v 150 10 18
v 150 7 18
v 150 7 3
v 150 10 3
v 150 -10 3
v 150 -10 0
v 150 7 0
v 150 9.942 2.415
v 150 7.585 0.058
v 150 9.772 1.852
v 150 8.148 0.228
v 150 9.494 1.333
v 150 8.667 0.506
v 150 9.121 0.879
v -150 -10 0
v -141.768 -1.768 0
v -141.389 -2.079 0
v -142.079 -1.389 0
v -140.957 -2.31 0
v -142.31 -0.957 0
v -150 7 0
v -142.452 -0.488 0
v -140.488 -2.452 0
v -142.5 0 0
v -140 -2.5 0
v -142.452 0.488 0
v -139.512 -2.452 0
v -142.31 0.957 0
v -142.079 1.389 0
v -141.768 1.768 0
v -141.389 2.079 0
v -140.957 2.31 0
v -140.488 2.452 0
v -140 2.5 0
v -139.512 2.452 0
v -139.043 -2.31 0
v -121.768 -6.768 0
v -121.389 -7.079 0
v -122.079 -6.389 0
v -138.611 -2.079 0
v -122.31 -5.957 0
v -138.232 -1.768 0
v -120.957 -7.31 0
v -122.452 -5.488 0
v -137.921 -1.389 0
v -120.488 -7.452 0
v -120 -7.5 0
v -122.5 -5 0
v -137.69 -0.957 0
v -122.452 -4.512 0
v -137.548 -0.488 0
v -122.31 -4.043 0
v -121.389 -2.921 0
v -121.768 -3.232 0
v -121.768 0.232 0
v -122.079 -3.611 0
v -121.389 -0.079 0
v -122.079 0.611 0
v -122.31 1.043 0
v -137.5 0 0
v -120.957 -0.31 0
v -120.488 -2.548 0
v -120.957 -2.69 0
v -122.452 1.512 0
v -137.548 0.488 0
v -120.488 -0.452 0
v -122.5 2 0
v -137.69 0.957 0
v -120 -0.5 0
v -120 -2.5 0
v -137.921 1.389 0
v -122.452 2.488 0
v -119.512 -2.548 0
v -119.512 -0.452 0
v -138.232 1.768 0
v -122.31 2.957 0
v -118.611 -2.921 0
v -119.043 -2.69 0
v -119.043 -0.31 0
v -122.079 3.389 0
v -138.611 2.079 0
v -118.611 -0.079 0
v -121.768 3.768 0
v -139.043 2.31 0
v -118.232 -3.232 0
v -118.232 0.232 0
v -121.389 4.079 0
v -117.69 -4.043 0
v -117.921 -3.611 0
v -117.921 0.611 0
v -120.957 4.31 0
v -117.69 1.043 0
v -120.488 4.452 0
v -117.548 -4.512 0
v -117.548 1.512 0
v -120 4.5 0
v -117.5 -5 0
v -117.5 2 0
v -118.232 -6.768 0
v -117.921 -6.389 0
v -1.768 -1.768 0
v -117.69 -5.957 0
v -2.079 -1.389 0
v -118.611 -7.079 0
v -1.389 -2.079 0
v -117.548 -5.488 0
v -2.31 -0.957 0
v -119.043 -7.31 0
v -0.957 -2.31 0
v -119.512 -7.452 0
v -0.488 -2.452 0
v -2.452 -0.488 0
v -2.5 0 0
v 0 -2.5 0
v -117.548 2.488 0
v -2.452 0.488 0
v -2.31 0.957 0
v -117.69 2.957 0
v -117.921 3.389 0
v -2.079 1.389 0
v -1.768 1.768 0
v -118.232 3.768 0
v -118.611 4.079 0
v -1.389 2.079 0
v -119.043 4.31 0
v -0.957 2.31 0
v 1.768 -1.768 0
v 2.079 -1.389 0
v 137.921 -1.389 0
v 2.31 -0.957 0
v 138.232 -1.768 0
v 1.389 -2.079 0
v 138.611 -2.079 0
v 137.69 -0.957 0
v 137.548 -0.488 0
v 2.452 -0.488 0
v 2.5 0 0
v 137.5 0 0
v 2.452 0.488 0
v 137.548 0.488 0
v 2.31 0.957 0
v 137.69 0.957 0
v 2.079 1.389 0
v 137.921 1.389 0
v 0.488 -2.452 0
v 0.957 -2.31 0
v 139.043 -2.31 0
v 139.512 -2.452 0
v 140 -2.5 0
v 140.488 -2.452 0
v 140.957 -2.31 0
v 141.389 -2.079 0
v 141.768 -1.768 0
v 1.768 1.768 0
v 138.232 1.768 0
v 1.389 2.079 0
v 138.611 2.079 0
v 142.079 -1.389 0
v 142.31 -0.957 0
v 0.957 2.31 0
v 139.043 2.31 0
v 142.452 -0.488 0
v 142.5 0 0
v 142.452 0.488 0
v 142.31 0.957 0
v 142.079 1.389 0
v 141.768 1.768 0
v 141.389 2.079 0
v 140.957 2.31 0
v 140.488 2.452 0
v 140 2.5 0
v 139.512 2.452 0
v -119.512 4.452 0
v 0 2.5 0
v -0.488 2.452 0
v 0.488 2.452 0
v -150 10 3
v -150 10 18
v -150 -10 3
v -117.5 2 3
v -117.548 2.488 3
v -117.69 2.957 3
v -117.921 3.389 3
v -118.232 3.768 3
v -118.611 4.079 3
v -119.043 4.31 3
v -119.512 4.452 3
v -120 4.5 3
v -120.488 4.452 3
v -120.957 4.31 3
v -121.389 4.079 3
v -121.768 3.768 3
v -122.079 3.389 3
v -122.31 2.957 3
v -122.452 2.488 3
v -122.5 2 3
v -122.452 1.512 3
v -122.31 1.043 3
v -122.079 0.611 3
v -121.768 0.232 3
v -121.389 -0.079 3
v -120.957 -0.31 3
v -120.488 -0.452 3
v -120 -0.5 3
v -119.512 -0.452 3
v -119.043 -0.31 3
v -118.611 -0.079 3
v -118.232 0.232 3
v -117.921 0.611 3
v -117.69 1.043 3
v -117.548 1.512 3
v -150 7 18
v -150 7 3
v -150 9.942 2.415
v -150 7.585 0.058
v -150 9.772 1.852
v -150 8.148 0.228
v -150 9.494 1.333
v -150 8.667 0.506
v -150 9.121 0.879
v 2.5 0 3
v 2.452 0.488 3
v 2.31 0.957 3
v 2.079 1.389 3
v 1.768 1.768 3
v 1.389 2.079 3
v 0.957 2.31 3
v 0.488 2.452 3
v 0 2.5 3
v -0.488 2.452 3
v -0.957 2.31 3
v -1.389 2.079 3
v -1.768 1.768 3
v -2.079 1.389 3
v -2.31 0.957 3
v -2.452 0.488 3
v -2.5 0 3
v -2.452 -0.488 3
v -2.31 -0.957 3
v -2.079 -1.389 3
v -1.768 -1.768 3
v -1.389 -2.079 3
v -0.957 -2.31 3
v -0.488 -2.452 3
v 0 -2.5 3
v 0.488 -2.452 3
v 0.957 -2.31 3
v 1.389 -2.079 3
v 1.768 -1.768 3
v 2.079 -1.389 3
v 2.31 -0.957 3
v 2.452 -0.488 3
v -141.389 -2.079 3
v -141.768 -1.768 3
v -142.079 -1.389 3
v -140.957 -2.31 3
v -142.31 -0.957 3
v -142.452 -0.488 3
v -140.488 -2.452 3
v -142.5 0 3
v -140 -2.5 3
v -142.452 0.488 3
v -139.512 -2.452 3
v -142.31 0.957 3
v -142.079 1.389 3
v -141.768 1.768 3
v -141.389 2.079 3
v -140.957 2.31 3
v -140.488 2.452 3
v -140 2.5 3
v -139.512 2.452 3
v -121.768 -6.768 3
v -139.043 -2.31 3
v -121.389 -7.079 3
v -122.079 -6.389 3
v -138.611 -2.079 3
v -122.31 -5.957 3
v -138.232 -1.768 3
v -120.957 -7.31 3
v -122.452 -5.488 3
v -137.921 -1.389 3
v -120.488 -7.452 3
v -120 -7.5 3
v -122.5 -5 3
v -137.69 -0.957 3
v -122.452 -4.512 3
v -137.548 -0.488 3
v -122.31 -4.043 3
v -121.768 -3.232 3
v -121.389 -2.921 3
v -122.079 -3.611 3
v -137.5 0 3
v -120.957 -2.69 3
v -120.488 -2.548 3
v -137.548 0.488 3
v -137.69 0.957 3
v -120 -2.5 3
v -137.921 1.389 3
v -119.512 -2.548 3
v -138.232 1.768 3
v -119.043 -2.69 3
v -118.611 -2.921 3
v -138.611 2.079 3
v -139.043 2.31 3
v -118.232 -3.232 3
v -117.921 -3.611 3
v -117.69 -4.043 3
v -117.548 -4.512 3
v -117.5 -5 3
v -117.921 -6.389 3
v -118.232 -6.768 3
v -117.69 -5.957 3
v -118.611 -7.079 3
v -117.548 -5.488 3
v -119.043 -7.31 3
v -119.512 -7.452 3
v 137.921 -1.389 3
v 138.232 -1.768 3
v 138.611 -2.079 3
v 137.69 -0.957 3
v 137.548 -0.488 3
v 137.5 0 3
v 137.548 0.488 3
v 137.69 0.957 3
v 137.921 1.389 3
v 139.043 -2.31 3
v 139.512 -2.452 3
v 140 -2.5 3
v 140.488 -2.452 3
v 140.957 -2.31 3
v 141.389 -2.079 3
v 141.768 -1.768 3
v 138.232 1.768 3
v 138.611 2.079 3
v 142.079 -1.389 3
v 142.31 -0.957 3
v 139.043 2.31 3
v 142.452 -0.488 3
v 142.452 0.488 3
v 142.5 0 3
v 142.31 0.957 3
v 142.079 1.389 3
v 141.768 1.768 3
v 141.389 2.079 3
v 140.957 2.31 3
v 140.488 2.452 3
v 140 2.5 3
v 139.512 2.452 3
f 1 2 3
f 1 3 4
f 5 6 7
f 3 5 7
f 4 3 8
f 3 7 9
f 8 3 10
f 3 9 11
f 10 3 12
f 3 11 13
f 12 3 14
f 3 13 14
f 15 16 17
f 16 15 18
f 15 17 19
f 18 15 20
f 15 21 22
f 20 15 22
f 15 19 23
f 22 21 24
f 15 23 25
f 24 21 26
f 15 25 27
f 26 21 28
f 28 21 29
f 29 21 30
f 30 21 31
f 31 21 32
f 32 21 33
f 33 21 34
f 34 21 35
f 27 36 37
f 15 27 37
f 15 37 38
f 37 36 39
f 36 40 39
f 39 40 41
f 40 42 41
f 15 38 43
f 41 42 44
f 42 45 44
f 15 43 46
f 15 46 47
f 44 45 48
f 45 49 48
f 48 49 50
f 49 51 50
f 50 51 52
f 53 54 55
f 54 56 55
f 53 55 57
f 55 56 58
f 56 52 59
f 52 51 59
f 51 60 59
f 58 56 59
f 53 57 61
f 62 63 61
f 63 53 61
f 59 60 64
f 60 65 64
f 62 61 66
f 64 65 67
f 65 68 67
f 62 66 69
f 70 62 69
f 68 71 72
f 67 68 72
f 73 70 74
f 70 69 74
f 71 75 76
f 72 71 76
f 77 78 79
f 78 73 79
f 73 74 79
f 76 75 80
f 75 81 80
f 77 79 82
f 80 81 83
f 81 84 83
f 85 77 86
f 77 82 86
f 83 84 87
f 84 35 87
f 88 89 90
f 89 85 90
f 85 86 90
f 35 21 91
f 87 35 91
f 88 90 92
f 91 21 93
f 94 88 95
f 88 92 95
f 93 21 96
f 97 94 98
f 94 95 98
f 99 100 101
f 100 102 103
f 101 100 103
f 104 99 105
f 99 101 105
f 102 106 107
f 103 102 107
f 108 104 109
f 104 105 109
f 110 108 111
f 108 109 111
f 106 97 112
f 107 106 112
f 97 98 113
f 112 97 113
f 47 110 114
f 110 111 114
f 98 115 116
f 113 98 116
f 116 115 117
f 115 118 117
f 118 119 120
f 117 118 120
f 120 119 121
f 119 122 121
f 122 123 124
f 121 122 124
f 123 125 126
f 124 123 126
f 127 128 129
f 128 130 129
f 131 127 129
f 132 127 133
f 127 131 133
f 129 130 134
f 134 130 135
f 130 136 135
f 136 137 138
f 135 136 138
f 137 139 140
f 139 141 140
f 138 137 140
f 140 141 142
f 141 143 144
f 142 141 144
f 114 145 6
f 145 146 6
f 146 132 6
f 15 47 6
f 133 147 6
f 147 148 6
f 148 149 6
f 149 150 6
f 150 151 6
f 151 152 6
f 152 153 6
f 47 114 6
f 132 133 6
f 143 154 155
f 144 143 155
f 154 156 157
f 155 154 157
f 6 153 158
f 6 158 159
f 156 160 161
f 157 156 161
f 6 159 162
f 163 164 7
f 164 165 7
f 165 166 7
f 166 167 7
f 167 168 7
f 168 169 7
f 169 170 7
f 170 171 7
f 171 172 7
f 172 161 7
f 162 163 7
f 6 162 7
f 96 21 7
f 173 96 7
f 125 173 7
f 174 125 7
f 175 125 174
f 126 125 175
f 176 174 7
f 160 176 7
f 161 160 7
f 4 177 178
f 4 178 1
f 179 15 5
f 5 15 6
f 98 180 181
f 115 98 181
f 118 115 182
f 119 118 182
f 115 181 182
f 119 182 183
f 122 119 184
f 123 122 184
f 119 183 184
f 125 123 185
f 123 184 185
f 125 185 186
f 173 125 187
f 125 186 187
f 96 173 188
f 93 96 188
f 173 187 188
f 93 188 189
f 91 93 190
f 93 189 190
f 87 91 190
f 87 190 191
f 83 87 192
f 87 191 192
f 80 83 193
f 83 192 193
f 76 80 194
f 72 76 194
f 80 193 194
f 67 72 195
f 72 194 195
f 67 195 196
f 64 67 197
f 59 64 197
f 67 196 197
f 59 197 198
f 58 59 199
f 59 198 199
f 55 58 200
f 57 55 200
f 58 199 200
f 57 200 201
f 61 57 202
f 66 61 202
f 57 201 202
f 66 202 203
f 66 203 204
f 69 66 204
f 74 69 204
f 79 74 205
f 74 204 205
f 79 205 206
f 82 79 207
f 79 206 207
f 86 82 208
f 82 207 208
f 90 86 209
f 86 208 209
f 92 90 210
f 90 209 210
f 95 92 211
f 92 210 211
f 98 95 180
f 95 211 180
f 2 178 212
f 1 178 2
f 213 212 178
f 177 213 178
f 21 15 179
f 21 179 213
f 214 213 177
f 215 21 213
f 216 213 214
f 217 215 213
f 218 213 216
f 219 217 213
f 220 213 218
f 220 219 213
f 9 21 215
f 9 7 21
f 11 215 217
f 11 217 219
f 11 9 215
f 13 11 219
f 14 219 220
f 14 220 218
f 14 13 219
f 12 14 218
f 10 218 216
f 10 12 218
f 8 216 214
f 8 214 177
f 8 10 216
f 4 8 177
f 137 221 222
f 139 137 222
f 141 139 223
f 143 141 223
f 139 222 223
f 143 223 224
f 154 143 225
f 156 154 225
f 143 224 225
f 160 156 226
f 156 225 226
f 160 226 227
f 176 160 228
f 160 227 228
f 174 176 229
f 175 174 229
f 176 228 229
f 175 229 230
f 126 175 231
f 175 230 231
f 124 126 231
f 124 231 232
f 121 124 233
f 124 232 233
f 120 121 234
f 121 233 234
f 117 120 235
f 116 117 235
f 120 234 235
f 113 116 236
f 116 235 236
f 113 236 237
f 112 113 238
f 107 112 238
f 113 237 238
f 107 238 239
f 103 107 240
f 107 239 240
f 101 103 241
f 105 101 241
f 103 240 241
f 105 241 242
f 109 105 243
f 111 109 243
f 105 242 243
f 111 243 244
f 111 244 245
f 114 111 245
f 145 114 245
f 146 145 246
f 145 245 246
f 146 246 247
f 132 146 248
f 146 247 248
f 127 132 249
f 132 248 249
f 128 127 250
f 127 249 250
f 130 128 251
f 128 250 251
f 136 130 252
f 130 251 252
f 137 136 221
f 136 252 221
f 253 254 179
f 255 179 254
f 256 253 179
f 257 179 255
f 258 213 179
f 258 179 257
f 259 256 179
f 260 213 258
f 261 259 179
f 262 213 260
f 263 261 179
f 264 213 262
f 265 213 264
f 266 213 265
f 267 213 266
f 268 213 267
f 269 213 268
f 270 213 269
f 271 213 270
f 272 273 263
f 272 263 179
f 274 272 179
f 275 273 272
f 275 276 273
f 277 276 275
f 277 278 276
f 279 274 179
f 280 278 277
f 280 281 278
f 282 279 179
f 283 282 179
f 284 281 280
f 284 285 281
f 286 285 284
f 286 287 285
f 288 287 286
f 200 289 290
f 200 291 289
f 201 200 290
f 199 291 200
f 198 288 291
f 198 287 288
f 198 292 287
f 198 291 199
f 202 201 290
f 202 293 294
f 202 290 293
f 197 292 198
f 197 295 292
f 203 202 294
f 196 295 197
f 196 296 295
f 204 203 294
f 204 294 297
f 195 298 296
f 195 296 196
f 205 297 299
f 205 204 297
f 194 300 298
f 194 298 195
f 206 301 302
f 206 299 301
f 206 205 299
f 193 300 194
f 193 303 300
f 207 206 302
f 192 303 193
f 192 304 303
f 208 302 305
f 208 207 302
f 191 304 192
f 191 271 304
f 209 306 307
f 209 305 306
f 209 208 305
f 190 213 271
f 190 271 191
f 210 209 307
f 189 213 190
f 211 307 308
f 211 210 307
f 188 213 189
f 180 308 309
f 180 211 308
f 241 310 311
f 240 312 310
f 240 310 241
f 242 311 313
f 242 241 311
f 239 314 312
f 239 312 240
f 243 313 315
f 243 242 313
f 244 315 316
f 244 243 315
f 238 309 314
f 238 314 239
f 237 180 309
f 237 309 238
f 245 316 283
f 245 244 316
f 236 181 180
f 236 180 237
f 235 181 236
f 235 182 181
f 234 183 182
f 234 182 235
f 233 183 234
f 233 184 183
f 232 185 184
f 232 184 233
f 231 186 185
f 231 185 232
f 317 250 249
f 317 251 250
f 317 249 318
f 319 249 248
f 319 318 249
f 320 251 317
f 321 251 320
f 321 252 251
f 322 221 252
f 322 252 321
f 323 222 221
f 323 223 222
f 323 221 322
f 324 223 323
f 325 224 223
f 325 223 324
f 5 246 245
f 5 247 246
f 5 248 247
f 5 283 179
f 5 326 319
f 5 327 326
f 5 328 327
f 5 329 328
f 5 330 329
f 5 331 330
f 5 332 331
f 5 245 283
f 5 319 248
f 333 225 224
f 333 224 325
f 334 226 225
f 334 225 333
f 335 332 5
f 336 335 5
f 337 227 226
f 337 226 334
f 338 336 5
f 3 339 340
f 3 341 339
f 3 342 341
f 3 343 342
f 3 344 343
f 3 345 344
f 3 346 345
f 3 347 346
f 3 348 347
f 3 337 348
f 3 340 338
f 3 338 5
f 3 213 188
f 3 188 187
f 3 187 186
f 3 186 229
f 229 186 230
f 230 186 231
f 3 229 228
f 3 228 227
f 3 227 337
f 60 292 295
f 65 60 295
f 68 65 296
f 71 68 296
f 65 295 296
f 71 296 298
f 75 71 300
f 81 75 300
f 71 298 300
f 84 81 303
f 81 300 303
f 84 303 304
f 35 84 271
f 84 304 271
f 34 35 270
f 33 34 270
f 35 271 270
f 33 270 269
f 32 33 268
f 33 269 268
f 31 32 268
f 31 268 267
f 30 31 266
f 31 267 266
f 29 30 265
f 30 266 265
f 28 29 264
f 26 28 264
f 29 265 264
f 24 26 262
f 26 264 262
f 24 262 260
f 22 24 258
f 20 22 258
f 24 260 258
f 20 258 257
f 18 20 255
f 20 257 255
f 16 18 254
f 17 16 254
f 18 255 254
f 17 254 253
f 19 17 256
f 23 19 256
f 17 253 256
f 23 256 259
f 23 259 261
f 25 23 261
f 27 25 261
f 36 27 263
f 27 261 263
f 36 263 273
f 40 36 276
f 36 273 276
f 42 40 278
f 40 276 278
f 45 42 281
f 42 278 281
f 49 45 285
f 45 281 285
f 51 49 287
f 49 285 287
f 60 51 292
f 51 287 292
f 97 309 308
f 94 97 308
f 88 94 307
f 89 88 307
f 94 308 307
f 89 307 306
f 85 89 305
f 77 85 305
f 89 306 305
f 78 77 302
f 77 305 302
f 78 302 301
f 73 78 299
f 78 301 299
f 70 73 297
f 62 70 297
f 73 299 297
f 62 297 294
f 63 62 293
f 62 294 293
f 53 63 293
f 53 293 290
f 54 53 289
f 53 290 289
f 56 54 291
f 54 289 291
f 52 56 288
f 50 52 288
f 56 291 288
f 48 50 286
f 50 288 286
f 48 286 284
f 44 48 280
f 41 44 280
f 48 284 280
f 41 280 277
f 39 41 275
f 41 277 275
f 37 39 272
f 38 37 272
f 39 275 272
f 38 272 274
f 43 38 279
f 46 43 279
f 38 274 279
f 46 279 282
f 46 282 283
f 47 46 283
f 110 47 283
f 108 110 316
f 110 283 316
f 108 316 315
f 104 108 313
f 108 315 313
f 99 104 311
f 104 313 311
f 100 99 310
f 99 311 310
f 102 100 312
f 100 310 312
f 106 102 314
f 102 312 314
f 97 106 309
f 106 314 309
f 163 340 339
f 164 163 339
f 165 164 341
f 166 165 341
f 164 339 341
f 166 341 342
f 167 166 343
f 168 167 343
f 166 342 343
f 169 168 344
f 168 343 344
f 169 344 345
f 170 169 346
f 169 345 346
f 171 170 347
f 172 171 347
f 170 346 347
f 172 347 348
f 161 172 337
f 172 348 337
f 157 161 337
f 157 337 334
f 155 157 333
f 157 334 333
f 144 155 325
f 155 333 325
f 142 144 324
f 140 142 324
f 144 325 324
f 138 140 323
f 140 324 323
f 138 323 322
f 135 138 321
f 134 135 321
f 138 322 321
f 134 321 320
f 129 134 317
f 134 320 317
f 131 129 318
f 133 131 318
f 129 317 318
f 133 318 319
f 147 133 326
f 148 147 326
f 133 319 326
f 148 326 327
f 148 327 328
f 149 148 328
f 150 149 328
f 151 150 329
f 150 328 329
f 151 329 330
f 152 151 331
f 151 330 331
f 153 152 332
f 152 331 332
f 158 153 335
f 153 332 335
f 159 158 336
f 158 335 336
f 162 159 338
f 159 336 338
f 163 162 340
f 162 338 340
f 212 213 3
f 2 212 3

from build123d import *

# Parameters (mm, degrees)
F0_W     = 300
F0_H     = 20
F1_DEPTH = 3
F2_R     = 2.5
F3_DEPTH = 3
F4_W     = 300
F4_H     = 3
F5_DEPTH = 15
F6_R     = 3


with BuildPart() as f1:
    # F0 (on Top) → F1 (new body)
    with BuildSketch(Plane.XY):
        Rectangle(F0_W, F0_H)
    extrude(amount=F1_DEPTH)

    # F2 (on face) → F3 (cut)
    with BuildSketch(Plane.XY.offset(3)):
        with Locations((-120, 2)):
            Circle(F2_R)
        with Locations((-120, -5)):
            Circle(F2_R)
        with Locations((-140, 0)):
            Circle(F2_R)
        Circle(F2_R)
        with Locations((140, 0)):
            Circle(F2_R)
    extrude(amount=-F3_DEPTH, mode=Mode.SUBTRACT)

    # F4 (on face) → F5 (join)
    with BuildSketch(Plane.XY.offset(3)):
        with Locations((0, 8.5)):
            Rectangle(F4_W, F4_H)
    extrude(amount=F5_DEPTH)

    # F6
    f6_edges = [f1.edges().sort_by_distance(p)[0] for p in [
        (0, 10, 0),
    ]]
    fillet(f6_edges, radius=F6_R)


solid = f1.part
